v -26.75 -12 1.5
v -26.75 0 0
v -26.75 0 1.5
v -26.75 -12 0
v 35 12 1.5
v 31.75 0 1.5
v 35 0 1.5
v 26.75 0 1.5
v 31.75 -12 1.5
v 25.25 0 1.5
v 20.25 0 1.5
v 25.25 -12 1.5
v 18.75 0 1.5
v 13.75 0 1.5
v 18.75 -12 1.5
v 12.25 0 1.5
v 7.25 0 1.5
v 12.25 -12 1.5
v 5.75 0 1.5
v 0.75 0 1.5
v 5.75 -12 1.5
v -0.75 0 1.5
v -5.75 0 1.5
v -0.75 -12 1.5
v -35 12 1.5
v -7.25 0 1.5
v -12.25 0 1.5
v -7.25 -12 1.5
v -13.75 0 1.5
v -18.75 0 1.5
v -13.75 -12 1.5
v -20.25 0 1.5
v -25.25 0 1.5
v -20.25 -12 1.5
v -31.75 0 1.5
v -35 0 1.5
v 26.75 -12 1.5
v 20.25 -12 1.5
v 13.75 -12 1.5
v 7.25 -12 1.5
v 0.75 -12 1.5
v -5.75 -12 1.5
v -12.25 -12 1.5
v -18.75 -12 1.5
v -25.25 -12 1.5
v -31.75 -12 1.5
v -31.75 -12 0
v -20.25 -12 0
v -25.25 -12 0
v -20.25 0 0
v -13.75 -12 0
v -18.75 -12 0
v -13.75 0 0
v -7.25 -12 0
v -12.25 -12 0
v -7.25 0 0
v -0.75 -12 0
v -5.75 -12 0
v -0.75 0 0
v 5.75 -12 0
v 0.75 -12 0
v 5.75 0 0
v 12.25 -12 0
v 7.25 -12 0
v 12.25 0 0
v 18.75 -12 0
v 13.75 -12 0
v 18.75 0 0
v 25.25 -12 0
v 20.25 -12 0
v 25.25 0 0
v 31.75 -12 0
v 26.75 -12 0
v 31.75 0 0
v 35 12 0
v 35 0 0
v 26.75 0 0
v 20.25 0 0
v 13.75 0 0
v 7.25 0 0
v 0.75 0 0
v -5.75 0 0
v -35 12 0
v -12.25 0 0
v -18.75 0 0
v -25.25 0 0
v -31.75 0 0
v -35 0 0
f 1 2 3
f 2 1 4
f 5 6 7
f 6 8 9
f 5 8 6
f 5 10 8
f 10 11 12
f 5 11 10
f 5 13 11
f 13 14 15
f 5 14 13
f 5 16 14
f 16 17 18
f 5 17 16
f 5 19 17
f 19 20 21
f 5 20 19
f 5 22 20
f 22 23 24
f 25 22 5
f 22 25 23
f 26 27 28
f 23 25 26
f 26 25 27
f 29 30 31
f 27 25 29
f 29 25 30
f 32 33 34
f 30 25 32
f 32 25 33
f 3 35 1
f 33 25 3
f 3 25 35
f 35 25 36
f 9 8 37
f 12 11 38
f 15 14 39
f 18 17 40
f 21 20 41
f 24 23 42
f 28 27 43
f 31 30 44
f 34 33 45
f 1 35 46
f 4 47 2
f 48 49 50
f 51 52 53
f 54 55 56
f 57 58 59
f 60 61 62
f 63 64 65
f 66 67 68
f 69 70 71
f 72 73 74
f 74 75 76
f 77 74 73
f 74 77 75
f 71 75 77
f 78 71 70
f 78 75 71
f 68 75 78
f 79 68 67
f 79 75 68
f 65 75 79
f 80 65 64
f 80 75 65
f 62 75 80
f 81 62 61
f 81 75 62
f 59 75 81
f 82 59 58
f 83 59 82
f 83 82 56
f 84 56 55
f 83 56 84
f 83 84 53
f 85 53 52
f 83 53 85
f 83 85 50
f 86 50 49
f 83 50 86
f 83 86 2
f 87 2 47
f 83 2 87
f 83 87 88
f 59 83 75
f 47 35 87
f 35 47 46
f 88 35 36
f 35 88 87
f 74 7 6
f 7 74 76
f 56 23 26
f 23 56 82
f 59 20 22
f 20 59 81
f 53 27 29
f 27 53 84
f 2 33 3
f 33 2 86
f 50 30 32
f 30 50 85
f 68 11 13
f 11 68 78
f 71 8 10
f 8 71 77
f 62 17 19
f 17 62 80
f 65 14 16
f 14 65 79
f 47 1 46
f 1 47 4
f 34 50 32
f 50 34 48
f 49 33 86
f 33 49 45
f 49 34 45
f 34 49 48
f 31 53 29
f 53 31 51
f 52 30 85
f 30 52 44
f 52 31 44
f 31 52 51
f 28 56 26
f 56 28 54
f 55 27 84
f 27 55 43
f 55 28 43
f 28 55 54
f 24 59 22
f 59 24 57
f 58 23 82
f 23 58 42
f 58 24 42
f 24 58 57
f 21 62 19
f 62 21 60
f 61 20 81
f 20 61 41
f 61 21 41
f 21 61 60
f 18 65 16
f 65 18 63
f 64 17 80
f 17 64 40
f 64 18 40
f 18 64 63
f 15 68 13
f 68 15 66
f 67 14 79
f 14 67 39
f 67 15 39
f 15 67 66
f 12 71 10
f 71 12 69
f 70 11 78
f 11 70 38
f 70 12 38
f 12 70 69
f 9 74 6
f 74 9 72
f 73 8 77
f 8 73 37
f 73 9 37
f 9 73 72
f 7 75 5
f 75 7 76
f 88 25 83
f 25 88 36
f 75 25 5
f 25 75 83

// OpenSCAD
// Dimensions
spine_x = 70;        // Length of the spine (X)
spine_y = 12;        // Width of the spine (Y)
spine_z = 1.5;       // Thickness of the comb (Z)
tooth_x = 5.0;       // Width of each tooth (X)
tooth_y = 12.0;      // Length of each tooth (Y)
gap_x = 1.5;         // Gap between neighbouring teeth (X)
num_teeth = 10;      // Number of teeth

// Calculated positioning to ensure the object is centered on the origin (X, Y)
// Total width of the teeth array (teeth + gaps)
total_teeth_width = (num_teeth * tooth_x) + ((num_teeth - 1) * gap_x);

// X-axis: Center the spine and the teeth array on X=0
spine_x_start = -spine_x / 2;
start_x = -total_teeth_width / 2;

// Y-axis: Center the entire object (spine + teeth) on Y=0
// The spine and teeth together have a total Y-span of spine_y + tooth_y
// To center this, the spine starts at tooth_y and ends at tooth_y + spine_y
// This places the teeth from -tooth_y to 0 and the spine from 0 to spine_y
spine_y_start = tooth_y; 
tooth_y_start = 0;

// Wait, let's re-calculate Y centering to be precise:
// Total Y span = spine_y + tooth_y = 12 + 12 = 24.
// To center 24 on Y=0, Y must go from -12 to 12.
// Since teeth hang in the -Y direction, teeth are from -12 to 0.
// Spine is from 0 to 12.
spine_y_start_final = 0;
tooth_y_start_final = -tooth_y;

// Build the comb
union() {
    // The spine (back bar)
    translate([spine_x_start, spine_y_start_final, 0]) {
        cube([spine_x, spine_y, spine_z]);
    }

    // The 10 rectangular teeth
    for (i = [0 : num_teeth - 1]) {
        translate([
            start_x + i * (tooth_x + gap_x), 
            tooth_y_start_final, 
            0
        ]) {
            cube([tooth_x, tooth_y, spine_z]);
        }
    }
}
